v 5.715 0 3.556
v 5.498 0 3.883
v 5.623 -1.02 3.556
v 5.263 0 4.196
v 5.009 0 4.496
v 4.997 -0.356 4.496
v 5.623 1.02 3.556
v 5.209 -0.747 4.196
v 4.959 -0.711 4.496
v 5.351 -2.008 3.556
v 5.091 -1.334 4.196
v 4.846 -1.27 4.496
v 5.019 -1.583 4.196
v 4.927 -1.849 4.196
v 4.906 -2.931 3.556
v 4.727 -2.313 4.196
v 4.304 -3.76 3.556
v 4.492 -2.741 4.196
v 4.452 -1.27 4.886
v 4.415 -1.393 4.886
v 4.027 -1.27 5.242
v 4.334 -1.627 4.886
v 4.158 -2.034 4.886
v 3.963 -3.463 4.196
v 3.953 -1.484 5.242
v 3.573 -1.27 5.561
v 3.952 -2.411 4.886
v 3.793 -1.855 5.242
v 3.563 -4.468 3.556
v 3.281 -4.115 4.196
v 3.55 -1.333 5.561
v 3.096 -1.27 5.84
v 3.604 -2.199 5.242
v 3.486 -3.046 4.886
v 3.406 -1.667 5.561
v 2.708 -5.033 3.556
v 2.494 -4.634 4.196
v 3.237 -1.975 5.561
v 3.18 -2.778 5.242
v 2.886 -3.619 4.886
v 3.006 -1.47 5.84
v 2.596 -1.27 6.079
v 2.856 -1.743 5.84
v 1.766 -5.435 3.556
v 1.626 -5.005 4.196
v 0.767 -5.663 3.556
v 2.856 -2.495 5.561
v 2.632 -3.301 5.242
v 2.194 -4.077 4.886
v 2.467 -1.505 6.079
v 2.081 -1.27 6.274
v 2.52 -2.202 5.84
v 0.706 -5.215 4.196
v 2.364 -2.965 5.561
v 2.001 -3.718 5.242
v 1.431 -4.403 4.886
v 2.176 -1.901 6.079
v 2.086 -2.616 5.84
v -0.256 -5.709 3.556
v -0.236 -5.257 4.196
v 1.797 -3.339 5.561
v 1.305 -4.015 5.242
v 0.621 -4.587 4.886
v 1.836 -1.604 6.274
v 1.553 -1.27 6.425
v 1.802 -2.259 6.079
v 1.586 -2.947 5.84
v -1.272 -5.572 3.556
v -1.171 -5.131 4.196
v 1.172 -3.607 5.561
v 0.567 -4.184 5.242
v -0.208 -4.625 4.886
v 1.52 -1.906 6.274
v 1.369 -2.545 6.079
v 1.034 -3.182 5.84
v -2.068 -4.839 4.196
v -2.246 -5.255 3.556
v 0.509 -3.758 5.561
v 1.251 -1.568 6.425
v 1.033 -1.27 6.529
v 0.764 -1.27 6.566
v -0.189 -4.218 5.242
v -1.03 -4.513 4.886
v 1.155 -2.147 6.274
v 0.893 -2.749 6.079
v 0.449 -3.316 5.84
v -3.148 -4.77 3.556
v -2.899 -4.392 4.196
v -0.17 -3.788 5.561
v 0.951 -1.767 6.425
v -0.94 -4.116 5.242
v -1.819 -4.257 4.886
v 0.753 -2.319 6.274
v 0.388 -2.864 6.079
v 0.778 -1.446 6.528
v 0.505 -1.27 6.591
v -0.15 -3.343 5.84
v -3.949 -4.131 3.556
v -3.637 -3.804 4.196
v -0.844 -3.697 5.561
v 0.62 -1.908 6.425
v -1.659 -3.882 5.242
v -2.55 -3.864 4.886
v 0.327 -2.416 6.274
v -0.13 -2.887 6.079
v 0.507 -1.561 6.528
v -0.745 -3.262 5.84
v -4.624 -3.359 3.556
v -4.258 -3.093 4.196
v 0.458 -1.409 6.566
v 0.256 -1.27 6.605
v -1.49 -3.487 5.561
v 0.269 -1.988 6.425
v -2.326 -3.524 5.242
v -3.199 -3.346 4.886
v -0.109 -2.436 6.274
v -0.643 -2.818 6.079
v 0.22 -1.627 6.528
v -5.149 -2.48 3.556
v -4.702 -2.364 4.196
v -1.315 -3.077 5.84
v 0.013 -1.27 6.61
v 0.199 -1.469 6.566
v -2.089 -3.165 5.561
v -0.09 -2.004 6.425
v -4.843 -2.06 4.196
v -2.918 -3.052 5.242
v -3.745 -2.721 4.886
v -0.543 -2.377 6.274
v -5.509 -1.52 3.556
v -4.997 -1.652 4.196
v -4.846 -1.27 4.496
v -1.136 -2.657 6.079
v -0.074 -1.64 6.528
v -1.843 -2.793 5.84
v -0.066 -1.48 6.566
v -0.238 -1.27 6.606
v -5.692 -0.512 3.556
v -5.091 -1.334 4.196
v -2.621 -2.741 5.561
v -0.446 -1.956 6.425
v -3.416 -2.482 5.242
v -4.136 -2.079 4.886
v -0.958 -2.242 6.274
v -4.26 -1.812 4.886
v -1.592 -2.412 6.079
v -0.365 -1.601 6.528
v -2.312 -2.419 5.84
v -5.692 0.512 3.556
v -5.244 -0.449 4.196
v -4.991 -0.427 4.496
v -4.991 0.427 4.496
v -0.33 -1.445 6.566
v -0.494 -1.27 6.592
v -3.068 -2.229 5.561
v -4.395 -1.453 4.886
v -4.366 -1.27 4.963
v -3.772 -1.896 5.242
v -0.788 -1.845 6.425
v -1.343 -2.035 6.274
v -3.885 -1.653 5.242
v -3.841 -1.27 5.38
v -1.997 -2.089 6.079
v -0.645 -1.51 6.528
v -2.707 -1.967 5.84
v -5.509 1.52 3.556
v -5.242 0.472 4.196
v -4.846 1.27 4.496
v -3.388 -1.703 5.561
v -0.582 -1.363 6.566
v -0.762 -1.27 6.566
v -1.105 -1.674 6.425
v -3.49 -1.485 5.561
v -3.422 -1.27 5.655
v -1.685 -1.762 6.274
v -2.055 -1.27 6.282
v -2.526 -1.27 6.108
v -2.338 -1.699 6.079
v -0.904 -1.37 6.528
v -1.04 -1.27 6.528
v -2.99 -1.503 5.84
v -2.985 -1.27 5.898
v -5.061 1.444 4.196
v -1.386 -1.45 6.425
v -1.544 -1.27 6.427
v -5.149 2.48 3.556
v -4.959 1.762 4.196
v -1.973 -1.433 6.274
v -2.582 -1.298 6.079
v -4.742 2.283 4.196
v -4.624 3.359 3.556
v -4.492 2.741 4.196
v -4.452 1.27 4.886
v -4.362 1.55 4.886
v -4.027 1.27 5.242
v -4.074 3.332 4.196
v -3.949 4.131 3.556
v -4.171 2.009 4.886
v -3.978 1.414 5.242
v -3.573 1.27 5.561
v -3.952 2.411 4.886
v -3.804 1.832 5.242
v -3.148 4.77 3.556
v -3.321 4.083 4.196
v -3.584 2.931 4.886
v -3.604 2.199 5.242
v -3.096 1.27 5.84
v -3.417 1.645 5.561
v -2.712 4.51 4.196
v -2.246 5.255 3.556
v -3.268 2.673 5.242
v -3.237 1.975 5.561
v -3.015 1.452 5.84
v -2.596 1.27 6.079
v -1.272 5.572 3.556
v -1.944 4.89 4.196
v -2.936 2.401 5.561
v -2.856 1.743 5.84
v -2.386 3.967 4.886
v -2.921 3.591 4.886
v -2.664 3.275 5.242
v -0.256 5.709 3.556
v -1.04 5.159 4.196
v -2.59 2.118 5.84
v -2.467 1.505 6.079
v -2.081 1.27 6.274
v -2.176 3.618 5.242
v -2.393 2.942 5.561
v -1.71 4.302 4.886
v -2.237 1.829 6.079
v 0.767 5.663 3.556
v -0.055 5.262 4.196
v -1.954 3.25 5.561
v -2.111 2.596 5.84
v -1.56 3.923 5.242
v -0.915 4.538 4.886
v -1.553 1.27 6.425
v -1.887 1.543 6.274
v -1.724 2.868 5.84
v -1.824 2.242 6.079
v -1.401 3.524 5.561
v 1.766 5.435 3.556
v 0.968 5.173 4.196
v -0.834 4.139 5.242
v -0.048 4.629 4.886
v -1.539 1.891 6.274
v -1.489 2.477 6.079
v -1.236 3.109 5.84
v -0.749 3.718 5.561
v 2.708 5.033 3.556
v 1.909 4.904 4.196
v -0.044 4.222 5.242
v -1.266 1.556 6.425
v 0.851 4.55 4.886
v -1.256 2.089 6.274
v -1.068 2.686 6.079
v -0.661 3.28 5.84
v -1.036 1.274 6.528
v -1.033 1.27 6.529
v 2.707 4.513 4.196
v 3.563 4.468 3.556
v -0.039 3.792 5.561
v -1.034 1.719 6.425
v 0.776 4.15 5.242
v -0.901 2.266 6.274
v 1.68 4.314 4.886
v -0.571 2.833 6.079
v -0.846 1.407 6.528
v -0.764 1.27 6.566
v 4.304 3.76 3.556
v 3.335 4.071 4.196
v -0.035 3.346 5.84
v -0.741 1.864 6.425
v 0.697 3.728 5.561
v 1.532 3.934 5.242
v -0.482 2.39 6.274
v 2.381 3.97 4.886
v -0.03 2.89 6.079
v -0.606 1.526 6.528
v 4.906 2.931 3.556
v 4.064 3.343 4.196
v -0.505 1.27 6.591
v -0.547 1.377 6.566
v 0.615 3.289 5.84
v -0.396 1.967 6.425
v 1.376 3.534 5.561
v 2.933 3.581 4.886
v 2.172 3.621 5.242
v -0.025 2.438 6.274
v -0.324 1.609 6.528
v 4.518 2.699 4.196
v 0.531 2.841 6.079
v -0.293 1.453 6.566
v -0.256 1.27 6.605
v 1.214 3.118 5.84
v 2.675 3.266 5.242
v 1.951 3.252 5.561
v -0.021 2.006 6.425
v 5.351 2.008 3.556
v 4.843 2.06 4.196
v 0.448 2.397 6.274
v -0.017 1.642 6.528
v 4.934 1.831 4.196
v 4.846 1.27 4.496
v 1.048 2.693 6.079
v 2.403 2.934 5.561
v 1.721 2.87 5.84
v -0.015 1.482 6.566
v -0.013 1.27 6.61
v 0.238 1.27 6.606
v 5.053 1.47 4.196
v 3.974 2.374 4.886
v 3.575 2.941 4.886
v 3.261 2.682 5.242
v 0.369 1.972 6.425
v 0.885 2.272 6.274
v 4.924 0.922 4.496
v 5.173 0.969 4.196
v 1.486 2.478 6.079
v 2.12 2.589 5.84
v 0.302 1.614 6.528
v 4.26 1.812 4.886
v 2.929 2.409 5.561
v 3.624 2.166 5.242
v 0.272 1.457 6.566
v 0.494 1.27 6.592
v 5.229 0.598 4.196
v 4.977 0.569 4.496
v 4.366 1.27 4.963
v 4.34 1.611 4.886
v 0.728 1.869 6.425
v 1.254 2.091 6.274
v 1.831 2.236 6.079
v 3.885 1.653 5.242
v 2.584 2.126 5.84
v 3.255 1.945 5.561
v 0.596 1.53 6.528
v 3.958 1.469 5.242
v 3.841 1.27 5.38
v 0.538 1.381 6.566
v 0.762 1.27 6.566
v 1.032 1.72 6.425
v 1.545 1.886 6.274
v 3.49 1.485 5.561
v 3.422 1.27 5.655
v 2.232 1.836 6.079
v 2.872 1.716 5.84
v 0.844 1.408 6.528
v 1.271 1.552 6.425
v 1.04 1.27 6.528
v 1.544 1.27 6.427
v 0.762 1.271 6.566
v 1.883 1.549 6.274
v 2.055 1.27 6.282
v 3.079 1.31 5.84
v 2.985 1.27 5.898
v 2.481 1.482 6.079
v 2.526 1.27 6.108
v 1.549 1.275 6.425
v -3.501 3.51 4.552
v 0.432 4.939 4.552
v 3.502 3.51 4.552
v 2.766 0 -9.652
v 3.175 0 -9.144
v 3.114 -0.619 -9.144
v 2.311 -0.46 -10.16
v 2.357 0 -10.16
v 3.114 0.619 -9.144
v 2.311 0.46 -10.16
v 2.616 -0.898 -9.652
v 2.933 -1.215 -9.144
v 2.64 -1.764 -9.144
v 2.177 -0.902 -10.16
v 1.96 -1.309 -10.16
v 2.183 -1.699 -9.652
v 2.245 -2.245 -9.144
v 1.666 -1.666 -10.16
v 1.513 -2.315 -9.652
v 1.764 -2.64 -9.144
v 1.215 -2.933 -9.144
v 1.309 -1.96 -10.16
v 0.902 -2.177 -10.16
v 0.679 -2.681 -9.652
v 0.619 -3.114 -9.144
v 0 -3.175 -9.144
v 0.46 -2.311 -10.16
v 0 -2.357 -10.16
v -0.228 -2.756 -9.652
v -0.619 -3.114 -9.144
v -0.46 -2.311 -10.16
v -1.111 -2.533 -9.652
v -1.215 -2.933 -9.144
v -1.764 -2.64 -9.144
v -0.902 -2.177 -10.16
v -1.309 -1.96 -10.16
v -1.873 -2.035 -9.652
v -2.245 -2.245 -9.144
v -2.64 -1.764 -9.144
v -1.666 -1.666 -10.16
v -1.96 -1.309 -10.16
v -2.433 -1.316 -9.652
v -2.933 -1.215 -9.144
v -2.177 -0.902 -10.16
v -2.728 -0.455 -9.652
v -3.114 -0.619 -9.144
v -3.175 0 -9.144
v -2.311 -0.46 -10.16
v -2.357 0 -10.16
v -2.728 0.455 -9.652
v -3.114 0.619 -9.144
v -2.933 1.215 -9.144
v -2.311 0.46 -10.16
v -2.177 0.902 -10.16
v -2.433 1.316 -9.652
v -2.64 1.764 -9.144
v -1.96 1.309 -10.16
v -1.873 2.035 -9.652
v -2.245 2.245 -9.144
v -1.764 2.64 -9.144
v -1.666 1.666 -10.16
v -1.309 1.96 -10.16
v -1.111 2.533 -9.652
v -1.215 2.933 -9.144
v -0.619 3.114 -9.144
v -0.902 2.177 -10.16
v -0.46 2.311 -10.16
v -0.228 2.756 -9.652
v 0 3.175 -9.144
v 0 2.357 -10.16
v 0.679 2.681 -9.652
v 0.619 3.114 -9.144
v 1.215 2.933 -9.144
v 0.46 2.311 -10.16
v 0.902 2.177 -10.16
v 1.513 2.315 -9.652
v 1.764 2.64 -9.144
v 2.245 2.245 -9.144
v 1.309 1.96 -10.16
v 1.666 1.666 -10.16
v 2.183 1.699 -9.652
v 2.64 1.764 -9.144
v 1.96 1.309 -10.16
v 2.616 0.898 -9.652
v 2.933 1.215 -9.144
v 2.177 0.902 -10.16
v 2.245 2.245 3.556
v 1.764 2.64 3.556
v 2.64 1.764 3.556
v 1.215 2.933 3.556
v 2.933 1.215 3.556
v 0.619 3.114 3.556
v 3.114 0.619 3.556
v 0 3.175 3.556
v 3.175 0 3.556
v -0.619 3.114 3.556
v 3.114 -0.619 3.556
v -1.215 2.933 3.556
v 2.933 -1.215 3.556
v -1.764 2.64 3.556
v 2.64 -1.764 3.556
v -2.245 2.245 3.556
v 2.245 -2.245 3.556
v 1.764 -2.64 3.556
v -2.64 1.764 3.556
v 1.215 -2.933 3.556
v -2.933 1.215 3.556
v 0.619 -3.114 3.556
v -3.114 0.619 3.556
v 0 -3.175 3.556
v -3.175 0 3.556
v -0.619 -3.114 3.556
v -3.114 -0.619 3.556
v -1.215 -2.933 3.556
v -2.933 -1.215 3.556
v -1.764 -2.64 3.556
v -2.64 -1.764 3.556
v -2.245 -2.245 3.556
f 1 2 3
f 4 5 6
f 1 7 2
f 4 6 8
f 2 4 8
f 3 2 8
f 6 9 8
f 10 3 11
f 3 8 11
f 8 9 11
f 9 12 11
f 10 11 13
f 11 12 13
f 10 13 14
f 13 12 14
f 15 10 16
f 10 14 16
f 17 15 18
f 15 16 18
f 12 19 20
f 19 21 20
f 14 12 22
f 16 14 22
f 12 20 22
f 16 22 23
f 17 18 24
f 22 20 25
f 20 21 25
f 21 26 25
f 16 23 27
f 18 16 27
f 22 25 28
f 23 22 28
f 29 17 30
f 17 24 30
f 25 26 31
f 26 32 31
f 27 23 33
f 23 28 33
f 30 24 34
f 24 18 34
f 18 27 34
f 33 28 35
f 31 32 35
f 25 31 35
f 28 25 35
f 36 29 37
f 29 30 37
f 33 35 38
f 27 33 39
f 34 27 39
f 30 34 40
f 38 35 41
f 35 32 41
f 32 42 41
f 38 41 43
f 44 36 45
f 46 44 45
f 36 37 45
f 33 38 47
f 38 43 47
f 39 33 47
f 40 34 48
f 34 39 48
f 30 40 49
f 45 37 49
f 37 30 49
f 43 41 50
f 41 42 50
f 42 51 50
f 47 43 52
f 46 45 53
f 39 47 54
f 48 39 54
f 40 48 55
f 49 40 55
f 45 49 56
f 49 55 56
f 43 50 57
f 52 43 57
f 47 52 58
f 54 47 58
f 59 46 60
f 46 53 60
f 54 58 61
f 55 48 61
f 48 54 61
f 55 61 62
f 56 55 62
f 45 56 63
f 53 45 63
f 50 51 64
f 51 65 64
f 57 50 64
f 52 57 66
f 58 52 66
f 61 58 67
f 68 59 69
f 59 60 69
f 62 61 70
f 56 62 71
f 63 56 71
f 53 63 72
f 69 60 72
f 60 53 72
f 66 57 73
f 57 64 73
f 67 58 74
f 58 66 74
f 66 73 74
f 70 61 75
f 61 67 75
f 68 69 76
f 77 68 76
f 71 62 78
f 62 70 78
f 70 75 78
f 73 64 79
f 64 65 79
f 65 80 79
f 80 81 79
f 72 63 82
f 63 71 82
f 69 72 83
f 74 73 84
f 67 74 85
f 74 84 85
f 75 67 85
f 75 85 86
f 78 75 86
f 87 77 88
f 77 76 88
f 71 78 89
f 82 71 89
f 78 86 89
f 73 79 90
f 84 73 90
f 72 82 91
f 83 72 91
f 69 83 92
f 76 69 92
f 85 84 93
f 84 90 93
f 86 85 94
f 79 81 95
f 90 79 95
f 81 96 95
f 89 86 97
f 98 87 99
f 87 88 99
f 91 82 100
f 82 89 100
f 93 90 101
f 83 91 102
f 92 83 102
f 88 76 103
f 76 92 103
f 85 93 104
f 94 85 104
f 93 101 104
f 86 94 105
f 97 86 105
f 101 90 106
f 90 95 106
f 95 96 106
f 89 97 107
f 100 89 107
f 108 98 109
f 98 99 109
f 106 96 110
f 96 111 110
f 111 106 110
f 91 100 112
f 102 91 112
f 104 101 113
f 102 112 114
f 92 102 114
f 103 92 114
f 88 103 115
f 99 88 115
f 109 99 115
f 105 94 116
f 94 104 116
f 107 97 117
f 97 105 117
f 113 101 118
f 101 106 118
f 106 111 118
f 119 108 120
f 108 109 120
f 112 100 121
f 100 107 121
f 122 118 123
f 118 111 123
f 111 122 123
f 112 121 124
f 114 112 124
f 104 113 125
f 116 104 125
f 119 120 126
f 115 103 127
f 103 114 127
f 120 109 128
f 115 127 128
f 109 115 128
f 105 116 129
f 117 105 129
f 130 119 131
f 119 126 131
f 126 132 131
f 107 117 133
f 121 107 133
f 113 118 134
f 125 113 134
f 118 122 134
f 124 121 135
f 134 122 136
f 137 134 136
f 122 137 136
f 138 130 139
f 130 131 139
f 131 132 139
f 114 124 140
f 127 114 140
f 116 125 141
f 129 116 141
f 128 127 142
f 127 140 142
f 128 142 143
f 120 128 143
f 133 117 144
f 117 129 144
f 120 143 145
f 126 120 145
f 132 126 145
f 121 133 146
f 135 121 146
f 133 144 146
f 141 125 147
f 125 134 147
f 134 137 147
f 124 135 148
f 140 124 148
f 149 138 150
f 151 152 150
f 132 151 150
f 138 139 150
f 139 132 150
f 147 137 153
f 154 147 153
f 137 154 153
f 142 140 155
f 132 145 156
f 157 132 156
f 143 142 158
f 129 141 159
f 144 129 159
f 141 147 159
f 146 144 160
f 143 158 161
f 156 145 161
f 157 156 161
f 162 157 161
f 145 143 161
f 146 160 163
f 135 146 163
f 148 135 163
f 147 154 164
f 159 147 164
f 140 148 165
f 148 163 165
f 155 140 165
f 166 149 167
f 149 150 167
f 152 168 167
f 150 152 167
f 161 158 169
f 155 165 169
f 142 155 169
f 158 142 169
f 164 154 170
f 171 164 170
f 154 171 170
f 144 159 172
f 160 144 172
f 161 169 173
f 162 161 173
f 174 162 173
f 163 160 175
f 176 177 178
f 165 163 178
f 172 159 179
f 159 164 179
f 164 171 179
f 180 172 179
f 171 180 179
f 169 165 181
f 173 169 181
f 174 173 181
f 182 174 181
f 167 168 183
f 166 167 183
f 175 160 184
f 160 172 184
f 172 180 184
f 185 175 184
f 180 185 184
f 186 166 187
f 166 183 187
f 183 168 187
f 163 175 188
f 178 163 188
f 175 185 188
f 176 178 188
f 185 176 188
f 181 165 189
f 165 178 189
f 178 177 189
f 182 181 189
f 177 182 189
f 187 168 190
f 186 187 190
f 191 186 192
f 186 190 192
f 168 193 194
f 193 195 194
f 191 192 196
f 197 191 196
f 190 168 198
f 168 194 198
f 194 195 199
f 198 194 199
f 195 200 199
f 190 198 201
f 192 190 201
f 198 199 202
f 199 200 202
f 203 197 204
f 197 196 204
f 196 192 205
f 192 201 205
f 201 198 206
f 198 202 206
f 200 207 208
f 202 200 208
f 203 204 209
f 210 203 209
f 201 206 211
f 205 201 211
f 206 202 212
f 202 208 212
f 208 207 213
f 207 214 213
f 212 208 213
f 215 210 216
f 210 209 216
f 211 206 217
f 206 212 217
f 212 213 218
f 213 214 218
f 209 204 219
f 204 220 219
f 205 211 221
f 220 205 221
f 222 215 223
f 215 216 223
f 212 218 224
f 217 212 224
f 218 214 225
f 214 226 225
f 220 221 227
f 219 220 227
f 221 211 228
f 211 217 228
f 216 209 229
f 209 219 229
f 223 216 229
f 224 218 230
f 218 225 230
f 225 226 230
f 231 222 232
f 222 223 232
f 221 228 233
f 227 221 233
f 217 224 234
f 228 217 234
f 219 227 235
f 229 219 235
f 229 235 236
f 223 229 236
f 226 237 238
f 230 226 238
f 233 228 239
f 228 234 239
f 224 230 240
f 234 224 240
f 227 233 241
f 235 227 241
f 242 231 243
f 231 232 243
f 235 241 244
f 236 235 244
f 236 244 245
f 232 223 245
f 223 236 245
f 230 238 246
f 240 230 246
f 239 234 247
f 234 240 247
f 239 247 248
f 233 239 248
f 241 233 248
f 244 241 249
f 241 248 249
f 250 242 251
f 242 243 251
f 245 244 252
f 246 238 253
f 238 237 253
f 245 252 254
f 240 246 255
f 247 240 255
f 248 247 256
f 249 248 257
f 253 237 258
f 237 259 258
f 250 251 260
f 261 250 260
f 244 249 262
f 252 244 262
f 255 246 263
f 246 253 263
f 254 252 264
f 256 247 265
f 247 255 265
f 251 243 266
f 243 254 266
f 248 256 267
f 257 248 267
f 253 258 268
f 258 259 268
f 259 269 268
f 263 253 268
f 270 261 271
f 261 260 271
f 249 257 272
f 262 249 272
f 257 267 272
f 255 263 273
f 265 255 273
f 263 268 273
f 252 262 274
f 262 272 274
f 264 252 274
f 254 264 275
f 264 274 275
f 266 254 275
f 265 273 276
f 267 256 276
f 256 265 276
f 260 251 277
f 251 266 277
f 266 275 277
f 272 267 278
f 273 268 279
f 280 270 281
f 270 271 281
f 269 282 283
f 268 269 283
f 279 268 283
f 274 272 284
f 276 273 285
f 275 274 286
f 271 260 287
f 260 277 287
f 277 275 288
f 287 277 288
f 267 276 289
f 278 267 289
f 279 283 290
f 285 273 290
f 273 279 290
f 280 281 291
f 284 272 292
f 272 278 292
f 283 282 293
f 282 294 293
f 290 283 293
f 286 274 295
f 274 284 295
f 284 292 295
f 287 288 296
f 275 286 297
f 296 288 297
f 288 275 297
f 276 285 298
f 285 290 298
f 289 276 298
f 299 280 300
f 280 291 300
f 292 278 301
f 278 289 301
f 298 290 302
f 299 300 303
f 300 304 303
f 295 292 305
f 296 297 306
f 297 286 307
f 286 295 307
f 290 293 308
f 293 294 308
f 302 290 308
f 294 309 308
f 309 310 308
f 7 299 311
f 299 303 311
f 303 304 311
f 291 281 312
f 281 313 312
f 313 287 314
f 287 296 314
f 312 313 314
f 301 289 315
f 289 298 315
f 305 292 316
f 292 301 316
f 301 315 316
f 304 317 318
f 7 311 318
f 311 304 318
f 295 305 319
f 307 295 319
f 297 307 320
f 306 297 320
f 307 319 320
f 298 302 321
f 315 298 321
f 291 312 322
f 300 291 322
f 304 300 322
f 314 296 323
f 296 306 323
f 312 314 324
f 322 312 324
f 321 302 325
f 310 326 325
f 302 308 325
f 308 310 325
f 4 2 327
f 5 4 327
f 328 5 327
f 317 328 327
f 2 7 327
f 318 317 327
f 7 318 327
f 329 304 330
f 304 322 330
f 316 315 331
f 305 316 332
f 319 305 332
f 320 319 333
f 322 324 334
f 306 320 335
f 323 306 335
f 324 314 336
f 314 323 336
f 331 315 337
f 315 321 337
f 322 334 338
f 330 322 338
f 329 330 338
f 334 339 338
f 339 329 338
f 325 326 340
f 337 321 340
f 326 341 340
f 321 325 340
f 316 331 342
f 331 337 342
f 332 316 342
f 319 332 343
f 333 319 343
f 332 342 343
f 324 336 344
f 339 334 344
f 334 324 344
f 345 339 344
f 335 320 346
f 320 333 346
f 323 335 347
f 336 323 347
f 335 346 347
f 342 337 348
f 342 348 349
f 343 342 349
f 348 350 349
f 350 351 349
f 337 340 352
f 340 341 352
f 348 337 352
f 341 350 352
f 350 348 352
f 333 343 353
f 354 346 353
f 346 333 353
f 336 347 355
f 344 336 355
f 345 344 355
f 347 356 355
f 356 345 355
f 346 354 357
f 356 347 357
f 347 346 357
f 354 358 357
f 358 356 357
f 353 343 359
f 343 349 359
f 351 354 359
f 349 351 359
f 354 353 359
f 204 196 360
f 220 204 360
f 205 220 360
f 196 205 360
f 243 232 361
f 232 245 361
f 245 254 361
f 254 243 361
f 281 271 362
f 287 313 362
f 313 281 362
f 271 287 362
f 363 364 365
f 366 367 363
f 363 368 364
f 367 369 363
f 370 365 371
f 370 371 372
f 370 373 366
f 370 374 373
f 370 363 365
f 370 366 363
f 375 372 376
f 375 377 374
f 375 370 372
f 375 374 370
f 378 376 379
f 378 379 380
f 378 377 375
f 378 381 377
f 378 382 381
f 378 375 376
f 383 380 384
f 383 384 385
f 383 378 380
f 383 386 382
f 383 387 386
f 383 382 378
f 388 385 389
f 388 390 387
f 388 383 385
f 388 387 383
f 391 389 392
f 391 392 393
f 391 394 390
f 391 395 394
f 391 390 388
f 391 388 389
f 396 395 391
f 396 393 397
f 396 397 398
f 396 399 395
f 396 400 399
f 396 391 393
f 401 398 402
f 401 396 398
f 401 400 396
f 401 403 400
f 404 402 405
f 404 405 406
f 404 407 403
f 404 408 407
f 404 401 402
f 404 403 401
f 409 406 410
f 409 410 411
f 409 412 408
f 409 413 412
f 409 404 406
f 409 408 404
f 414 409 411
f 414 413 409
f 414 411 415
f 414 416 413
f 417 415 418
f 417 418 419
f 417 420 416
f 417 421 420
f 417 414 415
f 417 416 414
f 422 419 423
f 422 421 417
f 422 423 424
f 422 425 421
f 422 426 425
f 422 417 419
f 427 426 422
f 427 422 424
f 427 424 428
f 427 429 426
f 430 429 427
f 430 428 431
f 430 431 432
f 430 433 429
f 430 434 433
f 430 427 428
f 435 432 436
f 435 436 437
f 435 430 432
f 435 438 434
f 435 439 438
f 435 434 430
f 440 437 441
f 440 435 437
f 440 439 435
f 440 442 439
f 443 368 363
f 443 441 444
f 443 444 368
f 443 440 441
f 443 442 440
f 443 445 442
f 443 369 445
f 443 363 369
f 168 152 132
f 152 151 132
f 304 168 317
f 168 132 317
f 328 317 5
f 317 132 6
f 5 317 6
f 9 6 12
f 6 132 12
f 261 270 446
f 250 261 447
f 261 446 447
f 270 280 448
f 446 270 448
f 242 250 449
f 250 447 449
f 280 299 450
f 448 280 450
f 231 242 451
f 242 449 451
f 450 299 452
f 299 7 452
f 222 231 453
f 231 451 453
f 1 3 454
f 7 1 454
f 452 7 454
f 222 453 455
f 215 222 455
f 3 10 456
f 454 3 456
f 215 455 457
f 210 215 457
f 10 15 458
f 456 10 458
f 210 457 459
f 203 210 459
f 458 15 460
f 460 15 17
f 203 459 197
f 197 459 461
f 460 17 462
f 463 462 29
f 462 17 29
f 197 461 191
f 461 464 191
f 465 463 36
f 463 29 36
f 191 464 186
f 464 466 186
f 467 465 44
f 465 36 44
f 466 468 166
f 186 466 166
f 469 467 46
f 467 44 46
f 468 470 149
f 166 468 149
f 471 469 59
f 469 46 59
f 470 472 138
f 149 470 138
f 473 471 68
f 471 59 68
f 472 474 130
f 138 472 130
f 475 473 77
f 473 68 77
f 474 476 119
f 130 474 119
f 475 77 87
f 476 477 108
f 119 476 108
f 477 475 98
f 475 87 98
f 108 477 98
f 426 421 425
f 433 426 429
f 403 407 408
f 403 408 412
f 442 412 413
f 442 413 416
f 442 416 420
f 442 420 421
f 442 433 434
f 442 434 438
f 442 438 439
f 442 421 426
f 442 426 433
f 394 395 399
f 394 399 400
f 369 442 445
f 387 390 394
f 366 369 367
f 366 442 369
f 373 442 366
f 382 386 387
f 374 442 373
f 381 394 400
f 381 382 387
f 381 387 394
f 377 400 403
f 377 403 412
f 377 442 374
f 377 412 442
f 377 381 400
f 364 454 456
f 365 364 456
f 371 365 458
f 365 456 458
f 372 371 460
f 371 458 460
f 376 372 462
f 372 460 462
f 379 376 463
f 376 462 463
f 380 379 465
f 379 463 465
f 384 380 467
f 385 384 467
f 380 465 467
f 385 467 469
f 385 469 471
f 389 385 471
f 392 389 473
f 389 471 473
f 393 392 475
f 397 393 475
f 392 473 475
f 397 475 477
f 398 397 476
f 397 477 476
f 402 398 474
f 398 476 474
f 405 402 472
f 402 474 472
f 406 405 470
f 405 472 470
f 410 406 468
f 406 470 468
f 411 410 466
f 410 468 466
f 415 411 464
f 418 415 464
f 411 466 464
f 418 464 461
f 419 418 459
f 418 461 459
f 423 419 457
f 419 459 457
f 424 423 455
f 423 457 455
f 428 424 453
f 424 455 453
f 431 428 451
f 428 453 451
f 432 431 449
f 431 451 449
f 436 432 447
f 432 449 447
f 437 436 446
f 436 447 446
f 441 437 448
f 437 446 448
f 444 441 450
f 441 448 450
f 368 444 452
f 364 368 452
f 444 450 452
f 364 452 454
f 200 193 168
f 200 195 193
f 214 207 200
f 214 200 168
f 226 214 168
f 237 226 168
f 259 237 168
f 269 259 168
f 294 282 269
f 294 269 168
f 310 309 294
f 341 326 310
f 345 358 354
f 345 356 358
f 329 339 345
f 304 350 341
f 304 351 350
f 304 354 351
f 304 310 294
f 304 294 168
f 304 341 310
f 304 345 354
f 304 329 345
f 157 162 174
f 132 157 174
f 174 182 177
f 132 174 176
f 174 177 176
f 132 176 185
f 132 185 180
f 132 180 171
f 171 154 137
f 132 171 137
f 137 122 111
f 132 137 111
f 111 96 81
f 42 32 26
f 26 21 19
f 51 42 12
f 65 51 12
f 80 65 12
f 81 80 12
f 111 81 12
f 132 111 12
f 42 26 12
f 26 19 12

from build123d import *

# Parameters (mm, degrees)
F1_FACE_R = 3.175
F3_R      = 2.356723
F6_W      = 10.16
F6_H      = 2.54
F7_DEPTH  = 2.3876


with BuildPart() as f1:
    # F0 (on Front) → F1 (revolve)
    with BuildSketch(Plane.XZ):
        with BuildLine():
            ThreePointArc((5.715, 3.556), (3.268863, 5.883953), (0, 6.731))
            Line((0, 6.731), (0, -9.144))
            Line((0, -9.144), (3.175, -9.144))
            Line((3.175, -9.144), (3.175, 3.556))
            Line((3.175, 3.556), (5.715, 3.556))
        make_face()
    revolve(axis=Axis((0, 0, -1.2065), (0, 0, -1)))

    # F1_face (on face) → F4 section 0
    with BuildSketch(Plane(origin=(0, 0, -9.144), x_dir=(1, 0, 0), z_dir=(0, 0, -1))):
        Circle(F1_FACE_R)
    # F3 (on offset) → F4 section 1
    with BuildSketch(Plane(origin=(0, 0, -10.16), x_dir=(1, 0, 0), z_dir=(0, 0, -1))):
        Circle(F3_R)
    loft()

    # F6 (on offset) → F7 (cut)
    with BuildSketch(Plane(origin=(0, 0, 6.8834), x_dir=(1, 0, 0), z_dir=(0, 0, -1))):
        Rectangle(F6_W, F6_H)
    extrude(amount=F7_DEPTH, mode=Mode.SUBTRACT)


solid = f1.part
